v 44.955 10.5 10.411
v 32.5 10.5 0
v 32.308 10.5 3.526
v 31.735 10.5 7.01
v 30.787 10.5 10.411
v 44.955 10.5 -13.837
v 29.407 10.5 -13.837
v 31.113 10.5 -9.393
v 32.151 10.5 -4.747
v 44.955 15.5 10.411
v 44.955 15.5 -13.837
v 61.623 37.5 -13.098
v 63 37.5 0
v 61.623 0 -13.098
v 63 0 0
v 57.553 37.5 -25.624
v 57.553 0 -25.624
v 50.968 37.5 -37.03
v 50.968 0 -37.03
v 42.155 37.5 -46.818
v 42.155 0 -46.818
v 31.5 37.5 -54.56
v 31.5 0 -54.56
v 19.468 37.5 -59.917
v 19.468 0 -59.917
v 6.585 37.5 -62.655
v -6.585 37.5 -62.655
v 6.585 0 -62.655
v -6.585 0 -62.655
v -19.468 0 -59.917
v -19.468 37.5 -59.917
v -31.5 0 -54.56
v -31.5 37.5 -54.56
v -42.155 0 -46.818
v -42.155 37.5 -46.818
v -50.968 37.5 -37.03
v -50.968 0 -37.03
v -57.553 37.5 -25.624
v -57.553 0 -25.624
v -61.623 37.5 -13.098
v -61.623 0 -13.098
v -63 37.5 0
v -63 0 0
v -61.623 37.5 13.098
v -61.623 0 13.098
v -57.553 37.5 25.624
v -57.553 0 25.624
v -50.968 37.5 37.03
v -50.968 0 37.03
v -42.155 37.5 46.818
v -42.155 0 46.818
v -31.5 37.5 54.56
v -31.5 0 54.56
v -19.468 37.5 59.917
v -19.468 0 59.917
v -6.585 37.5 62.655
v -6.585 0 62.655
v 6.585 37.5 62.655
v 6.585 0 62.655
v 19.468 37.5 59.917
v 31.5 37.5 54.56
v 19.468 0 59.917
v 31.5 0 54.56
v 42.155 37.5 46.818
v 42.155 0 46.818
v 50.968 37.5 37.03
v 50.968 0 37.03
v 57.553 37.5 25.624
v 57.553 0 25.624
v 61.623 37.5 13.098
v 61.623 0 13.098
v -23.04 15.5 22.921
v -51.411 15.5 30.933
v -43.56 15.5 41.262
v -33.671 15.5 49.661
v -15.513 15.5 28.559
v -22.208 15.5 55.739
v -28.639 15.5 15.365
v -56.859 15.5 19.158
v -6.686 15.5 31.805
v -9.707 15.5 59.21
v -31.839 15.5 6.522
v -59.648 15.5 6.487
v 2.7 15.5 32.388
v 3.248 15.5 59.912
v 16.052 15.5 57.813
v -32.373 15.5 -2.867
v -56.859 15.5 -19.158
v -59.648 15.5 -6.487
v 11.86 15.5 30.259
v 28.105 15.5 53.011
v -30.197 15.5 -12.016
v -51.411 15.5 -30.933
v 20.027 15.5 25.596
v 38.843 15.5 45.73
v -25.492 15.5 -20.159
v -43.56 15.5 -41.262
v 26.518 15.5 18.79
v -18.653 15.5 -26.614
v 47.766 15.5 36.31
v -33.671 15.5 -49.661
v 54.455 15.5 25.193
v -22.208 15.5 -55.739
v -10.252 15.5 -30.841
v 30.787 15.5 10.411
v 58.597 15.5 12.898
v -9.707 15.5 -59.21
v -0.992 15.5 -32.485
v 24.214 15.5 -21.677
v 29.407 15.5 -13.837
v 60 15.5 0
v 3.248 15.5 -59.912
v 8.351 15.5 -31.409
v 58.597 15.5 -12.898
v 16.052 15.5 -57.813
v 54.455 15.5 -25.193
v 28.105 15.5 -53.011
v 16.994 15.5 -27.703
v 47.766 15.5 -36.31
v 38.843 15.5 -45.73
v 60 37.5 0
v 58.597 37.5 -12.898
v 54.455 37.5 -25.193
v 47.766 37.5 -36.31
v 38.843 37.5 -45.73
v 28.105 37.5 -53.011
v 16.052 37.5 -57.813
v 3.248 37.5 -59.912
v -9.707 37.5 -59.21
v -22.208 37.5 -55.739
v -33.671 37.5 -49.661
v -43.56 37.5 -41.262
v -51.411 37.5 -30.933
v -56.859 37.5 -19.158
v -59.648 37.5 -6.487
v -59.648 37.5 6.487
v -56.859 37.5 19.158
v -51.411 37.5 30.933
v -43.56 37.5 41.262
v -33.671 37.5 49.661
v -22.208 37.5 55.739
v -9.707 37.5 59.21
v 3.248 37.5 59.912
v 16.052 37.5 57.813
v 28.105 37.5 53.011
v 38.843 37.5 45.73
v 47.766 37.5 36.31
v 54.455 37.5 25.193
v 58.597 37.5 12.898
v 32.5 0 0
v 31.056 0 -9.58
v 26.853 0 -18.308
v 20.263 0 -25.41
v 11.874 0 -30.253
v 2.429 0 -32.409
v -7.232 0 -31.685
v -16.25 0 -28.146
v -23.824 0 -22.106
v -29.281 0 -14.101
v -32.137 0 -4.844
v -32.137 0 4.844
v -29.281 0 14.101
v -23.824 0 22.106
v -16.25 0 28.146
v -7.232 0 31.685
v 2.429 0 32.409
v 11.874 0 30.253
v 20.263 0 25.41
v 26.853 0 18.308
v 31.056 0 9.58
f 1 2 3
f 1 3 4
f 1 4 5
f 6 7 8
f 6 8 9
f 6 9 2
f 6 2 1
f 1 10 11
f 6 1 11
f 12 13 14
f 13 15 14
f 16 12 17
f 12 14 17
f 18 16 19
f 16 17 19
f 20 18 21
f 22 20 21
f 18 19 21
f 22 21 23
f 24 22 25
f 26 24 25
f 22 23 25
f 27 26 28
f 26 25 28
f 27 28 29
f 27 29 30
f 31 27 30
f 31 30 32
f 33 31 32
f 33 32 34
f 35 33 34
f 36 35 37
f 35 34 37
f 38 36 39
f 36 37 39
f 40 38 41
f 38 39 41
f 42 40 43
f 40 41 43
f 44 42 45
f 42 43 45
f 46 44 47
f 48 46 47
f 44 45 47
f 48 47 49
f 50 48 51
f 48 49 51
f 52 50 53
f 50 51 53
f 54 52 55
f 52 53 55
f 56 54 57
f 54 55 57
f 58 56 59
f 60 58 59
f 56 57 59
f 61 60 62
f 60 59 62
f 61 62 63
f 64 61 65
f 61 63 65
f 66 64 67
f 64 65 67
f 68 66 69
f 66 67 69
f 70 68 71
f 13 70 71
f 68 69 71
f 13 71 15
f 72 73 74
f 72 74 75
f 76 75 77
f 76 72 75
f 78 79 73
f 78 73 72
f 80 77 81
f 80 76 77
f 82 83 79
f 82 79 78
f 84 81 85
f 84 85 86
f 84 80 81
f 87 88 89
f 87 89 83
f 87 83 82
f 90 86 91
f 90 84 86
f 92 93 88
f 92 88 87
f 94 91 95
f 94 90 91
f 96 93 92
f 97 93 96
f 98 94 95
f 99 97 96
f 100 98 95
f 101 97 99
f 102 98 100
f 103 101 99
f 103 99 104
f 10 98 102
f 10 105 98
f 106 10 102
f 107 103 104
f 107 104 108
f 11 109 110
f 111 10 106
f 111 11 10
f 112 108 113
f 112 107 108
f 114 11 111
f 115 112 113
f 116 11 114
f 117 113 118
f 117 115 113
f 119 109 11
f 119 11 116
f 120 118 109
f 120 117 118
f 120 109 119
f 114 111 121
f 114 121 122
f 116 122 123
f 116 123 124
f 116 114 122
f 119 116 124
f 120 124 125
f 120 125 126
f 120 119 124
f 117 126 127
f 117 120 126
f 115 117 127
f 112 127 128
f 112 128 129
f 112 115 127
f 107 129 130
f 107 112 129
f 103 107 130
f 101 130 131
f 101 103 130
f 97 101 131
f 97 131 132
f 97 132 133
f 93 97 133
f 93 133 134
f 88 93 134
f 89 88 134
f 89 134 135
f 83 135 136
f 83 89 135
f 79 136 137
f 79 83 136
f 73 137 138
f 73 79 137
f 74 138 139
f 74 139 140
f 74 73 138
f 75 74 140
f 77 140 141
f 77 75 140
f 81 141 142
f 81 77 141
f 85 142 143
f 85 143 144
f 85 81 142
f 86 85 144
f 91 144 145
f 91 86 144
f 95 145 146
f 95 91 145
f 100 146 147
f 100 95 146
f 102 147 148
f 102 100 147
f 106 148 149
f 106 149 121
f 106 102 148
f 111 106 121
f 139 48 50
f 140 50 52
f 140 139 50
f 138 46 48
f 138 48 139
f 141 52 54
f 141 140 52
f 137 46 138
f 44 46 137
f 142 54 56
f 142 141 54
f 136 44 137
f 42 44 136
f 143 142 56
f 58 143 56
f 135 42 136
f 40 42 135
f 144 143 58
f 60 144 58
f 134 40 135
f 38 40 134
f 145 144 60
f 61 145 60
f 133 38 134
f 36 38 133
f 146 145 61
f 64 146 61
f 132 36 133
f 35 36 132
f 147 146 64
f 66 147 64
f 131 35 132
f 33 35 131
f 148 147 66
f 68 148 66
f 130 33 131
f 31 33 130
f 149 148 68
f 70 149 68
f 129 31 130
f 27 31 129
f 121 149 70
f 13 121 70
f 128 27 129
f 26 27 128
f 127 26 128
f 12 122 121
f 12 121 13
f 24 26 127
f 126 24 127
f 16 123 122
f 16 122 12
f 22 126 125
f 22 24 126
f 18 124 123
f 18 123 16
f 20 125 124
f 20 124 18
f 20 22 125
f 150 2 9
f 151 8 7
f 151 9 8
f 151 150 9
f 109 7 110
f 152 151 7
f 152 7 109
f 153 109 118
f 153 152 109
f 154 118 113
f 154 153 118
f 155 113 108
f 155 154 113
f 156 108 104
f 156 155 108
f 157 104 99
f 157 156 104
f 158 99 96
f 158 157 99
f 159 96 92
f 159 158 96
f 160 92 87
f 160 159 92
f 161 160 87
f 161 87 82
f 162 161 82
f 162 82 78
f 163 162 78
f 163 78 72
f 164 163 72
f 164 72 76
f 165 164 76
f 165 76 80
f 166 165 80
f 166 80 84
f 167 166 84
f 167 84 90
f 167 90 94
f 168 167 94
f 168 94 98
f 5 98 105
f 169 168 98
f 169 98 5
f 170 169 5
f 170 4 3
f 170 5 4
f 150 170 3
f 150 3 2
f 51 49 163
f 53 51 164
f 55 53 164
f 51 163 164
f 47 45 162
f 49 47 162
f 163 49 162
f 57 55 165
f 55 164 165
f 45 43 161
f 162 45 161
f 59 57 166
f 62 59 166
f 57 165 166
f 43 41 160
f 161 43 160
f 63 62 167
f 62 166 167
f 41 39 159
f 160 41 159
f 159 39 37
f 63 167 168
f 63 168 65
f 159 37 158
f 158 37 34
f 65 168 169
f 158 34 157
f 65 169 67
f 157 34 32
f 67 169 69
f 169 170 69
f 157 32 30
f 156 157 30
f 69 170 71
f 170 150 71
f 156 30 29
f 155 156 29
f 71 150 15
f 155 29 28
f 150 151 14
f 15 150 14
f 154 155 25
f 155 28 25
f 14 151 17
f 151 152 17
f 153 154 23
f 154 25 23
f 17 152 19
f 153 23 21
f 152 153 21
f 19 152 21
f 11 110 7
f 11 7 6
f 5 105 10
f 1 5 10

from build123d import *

# Parameters (mm, degrees)
SKETCH4_R           = 63
SKETCH4_R_2         = 32.5
BOSS_EXTRUDE1_DEPTH = 15.5
SKETCH5_R           = 63
SKETCH5_R_2         = 60
BOSS_EXTRUDE2_DEPTH = 22
SKETCH7_W           = 25
SKETCH7_H           = 24.247693635
CUT_EXTRUDE1_DEPTH  = 5


with BuildPart() as part:
    # Sketch4 → Boss-Extrude1 (new body)
    with BuildSketch(Plane(origin=(0, 0, 0), x_dir=(1, 0, 0), z_dir=(0, 1, 0))):
        Circle(SKETCH4_R)
        Circle(SKETCH4_R_2, mode=Mode.SUBTRACT)
    extrude(amount=BOSS_EXTRUDE1_DEPTH)

    # Sketch5 → Boss-Extrude2 (add)
    with BuildSketch(Plane(origin=(0, 15.5, 0), x_dir=(1, 0, 0), z_dir=(0, 1, 0))):
        Circle(SKETCH5_R)
        Circle(SKETCH5_R_2, mode=Mode.SUBTRACT)
    extrude(amount=BOSS_EXTRUDE2_DEPTH)

    # Sketch7 → Cut-Extrude1 (cut)
    with BuildSketch(Plane(origin=(0, 15.5, 0), x_dir=(1, 0, 0), z_dir=(0, 1, 0))):
        with Locations((32.454830069, 1.71289381)):
            Rectangle(SKETCH7_W, SKETCH7_H)
    extrude(amount=-CUT_EXTRUDE1_DEPTH, mode=Mode.SUBTRACT)


solid = part.part
